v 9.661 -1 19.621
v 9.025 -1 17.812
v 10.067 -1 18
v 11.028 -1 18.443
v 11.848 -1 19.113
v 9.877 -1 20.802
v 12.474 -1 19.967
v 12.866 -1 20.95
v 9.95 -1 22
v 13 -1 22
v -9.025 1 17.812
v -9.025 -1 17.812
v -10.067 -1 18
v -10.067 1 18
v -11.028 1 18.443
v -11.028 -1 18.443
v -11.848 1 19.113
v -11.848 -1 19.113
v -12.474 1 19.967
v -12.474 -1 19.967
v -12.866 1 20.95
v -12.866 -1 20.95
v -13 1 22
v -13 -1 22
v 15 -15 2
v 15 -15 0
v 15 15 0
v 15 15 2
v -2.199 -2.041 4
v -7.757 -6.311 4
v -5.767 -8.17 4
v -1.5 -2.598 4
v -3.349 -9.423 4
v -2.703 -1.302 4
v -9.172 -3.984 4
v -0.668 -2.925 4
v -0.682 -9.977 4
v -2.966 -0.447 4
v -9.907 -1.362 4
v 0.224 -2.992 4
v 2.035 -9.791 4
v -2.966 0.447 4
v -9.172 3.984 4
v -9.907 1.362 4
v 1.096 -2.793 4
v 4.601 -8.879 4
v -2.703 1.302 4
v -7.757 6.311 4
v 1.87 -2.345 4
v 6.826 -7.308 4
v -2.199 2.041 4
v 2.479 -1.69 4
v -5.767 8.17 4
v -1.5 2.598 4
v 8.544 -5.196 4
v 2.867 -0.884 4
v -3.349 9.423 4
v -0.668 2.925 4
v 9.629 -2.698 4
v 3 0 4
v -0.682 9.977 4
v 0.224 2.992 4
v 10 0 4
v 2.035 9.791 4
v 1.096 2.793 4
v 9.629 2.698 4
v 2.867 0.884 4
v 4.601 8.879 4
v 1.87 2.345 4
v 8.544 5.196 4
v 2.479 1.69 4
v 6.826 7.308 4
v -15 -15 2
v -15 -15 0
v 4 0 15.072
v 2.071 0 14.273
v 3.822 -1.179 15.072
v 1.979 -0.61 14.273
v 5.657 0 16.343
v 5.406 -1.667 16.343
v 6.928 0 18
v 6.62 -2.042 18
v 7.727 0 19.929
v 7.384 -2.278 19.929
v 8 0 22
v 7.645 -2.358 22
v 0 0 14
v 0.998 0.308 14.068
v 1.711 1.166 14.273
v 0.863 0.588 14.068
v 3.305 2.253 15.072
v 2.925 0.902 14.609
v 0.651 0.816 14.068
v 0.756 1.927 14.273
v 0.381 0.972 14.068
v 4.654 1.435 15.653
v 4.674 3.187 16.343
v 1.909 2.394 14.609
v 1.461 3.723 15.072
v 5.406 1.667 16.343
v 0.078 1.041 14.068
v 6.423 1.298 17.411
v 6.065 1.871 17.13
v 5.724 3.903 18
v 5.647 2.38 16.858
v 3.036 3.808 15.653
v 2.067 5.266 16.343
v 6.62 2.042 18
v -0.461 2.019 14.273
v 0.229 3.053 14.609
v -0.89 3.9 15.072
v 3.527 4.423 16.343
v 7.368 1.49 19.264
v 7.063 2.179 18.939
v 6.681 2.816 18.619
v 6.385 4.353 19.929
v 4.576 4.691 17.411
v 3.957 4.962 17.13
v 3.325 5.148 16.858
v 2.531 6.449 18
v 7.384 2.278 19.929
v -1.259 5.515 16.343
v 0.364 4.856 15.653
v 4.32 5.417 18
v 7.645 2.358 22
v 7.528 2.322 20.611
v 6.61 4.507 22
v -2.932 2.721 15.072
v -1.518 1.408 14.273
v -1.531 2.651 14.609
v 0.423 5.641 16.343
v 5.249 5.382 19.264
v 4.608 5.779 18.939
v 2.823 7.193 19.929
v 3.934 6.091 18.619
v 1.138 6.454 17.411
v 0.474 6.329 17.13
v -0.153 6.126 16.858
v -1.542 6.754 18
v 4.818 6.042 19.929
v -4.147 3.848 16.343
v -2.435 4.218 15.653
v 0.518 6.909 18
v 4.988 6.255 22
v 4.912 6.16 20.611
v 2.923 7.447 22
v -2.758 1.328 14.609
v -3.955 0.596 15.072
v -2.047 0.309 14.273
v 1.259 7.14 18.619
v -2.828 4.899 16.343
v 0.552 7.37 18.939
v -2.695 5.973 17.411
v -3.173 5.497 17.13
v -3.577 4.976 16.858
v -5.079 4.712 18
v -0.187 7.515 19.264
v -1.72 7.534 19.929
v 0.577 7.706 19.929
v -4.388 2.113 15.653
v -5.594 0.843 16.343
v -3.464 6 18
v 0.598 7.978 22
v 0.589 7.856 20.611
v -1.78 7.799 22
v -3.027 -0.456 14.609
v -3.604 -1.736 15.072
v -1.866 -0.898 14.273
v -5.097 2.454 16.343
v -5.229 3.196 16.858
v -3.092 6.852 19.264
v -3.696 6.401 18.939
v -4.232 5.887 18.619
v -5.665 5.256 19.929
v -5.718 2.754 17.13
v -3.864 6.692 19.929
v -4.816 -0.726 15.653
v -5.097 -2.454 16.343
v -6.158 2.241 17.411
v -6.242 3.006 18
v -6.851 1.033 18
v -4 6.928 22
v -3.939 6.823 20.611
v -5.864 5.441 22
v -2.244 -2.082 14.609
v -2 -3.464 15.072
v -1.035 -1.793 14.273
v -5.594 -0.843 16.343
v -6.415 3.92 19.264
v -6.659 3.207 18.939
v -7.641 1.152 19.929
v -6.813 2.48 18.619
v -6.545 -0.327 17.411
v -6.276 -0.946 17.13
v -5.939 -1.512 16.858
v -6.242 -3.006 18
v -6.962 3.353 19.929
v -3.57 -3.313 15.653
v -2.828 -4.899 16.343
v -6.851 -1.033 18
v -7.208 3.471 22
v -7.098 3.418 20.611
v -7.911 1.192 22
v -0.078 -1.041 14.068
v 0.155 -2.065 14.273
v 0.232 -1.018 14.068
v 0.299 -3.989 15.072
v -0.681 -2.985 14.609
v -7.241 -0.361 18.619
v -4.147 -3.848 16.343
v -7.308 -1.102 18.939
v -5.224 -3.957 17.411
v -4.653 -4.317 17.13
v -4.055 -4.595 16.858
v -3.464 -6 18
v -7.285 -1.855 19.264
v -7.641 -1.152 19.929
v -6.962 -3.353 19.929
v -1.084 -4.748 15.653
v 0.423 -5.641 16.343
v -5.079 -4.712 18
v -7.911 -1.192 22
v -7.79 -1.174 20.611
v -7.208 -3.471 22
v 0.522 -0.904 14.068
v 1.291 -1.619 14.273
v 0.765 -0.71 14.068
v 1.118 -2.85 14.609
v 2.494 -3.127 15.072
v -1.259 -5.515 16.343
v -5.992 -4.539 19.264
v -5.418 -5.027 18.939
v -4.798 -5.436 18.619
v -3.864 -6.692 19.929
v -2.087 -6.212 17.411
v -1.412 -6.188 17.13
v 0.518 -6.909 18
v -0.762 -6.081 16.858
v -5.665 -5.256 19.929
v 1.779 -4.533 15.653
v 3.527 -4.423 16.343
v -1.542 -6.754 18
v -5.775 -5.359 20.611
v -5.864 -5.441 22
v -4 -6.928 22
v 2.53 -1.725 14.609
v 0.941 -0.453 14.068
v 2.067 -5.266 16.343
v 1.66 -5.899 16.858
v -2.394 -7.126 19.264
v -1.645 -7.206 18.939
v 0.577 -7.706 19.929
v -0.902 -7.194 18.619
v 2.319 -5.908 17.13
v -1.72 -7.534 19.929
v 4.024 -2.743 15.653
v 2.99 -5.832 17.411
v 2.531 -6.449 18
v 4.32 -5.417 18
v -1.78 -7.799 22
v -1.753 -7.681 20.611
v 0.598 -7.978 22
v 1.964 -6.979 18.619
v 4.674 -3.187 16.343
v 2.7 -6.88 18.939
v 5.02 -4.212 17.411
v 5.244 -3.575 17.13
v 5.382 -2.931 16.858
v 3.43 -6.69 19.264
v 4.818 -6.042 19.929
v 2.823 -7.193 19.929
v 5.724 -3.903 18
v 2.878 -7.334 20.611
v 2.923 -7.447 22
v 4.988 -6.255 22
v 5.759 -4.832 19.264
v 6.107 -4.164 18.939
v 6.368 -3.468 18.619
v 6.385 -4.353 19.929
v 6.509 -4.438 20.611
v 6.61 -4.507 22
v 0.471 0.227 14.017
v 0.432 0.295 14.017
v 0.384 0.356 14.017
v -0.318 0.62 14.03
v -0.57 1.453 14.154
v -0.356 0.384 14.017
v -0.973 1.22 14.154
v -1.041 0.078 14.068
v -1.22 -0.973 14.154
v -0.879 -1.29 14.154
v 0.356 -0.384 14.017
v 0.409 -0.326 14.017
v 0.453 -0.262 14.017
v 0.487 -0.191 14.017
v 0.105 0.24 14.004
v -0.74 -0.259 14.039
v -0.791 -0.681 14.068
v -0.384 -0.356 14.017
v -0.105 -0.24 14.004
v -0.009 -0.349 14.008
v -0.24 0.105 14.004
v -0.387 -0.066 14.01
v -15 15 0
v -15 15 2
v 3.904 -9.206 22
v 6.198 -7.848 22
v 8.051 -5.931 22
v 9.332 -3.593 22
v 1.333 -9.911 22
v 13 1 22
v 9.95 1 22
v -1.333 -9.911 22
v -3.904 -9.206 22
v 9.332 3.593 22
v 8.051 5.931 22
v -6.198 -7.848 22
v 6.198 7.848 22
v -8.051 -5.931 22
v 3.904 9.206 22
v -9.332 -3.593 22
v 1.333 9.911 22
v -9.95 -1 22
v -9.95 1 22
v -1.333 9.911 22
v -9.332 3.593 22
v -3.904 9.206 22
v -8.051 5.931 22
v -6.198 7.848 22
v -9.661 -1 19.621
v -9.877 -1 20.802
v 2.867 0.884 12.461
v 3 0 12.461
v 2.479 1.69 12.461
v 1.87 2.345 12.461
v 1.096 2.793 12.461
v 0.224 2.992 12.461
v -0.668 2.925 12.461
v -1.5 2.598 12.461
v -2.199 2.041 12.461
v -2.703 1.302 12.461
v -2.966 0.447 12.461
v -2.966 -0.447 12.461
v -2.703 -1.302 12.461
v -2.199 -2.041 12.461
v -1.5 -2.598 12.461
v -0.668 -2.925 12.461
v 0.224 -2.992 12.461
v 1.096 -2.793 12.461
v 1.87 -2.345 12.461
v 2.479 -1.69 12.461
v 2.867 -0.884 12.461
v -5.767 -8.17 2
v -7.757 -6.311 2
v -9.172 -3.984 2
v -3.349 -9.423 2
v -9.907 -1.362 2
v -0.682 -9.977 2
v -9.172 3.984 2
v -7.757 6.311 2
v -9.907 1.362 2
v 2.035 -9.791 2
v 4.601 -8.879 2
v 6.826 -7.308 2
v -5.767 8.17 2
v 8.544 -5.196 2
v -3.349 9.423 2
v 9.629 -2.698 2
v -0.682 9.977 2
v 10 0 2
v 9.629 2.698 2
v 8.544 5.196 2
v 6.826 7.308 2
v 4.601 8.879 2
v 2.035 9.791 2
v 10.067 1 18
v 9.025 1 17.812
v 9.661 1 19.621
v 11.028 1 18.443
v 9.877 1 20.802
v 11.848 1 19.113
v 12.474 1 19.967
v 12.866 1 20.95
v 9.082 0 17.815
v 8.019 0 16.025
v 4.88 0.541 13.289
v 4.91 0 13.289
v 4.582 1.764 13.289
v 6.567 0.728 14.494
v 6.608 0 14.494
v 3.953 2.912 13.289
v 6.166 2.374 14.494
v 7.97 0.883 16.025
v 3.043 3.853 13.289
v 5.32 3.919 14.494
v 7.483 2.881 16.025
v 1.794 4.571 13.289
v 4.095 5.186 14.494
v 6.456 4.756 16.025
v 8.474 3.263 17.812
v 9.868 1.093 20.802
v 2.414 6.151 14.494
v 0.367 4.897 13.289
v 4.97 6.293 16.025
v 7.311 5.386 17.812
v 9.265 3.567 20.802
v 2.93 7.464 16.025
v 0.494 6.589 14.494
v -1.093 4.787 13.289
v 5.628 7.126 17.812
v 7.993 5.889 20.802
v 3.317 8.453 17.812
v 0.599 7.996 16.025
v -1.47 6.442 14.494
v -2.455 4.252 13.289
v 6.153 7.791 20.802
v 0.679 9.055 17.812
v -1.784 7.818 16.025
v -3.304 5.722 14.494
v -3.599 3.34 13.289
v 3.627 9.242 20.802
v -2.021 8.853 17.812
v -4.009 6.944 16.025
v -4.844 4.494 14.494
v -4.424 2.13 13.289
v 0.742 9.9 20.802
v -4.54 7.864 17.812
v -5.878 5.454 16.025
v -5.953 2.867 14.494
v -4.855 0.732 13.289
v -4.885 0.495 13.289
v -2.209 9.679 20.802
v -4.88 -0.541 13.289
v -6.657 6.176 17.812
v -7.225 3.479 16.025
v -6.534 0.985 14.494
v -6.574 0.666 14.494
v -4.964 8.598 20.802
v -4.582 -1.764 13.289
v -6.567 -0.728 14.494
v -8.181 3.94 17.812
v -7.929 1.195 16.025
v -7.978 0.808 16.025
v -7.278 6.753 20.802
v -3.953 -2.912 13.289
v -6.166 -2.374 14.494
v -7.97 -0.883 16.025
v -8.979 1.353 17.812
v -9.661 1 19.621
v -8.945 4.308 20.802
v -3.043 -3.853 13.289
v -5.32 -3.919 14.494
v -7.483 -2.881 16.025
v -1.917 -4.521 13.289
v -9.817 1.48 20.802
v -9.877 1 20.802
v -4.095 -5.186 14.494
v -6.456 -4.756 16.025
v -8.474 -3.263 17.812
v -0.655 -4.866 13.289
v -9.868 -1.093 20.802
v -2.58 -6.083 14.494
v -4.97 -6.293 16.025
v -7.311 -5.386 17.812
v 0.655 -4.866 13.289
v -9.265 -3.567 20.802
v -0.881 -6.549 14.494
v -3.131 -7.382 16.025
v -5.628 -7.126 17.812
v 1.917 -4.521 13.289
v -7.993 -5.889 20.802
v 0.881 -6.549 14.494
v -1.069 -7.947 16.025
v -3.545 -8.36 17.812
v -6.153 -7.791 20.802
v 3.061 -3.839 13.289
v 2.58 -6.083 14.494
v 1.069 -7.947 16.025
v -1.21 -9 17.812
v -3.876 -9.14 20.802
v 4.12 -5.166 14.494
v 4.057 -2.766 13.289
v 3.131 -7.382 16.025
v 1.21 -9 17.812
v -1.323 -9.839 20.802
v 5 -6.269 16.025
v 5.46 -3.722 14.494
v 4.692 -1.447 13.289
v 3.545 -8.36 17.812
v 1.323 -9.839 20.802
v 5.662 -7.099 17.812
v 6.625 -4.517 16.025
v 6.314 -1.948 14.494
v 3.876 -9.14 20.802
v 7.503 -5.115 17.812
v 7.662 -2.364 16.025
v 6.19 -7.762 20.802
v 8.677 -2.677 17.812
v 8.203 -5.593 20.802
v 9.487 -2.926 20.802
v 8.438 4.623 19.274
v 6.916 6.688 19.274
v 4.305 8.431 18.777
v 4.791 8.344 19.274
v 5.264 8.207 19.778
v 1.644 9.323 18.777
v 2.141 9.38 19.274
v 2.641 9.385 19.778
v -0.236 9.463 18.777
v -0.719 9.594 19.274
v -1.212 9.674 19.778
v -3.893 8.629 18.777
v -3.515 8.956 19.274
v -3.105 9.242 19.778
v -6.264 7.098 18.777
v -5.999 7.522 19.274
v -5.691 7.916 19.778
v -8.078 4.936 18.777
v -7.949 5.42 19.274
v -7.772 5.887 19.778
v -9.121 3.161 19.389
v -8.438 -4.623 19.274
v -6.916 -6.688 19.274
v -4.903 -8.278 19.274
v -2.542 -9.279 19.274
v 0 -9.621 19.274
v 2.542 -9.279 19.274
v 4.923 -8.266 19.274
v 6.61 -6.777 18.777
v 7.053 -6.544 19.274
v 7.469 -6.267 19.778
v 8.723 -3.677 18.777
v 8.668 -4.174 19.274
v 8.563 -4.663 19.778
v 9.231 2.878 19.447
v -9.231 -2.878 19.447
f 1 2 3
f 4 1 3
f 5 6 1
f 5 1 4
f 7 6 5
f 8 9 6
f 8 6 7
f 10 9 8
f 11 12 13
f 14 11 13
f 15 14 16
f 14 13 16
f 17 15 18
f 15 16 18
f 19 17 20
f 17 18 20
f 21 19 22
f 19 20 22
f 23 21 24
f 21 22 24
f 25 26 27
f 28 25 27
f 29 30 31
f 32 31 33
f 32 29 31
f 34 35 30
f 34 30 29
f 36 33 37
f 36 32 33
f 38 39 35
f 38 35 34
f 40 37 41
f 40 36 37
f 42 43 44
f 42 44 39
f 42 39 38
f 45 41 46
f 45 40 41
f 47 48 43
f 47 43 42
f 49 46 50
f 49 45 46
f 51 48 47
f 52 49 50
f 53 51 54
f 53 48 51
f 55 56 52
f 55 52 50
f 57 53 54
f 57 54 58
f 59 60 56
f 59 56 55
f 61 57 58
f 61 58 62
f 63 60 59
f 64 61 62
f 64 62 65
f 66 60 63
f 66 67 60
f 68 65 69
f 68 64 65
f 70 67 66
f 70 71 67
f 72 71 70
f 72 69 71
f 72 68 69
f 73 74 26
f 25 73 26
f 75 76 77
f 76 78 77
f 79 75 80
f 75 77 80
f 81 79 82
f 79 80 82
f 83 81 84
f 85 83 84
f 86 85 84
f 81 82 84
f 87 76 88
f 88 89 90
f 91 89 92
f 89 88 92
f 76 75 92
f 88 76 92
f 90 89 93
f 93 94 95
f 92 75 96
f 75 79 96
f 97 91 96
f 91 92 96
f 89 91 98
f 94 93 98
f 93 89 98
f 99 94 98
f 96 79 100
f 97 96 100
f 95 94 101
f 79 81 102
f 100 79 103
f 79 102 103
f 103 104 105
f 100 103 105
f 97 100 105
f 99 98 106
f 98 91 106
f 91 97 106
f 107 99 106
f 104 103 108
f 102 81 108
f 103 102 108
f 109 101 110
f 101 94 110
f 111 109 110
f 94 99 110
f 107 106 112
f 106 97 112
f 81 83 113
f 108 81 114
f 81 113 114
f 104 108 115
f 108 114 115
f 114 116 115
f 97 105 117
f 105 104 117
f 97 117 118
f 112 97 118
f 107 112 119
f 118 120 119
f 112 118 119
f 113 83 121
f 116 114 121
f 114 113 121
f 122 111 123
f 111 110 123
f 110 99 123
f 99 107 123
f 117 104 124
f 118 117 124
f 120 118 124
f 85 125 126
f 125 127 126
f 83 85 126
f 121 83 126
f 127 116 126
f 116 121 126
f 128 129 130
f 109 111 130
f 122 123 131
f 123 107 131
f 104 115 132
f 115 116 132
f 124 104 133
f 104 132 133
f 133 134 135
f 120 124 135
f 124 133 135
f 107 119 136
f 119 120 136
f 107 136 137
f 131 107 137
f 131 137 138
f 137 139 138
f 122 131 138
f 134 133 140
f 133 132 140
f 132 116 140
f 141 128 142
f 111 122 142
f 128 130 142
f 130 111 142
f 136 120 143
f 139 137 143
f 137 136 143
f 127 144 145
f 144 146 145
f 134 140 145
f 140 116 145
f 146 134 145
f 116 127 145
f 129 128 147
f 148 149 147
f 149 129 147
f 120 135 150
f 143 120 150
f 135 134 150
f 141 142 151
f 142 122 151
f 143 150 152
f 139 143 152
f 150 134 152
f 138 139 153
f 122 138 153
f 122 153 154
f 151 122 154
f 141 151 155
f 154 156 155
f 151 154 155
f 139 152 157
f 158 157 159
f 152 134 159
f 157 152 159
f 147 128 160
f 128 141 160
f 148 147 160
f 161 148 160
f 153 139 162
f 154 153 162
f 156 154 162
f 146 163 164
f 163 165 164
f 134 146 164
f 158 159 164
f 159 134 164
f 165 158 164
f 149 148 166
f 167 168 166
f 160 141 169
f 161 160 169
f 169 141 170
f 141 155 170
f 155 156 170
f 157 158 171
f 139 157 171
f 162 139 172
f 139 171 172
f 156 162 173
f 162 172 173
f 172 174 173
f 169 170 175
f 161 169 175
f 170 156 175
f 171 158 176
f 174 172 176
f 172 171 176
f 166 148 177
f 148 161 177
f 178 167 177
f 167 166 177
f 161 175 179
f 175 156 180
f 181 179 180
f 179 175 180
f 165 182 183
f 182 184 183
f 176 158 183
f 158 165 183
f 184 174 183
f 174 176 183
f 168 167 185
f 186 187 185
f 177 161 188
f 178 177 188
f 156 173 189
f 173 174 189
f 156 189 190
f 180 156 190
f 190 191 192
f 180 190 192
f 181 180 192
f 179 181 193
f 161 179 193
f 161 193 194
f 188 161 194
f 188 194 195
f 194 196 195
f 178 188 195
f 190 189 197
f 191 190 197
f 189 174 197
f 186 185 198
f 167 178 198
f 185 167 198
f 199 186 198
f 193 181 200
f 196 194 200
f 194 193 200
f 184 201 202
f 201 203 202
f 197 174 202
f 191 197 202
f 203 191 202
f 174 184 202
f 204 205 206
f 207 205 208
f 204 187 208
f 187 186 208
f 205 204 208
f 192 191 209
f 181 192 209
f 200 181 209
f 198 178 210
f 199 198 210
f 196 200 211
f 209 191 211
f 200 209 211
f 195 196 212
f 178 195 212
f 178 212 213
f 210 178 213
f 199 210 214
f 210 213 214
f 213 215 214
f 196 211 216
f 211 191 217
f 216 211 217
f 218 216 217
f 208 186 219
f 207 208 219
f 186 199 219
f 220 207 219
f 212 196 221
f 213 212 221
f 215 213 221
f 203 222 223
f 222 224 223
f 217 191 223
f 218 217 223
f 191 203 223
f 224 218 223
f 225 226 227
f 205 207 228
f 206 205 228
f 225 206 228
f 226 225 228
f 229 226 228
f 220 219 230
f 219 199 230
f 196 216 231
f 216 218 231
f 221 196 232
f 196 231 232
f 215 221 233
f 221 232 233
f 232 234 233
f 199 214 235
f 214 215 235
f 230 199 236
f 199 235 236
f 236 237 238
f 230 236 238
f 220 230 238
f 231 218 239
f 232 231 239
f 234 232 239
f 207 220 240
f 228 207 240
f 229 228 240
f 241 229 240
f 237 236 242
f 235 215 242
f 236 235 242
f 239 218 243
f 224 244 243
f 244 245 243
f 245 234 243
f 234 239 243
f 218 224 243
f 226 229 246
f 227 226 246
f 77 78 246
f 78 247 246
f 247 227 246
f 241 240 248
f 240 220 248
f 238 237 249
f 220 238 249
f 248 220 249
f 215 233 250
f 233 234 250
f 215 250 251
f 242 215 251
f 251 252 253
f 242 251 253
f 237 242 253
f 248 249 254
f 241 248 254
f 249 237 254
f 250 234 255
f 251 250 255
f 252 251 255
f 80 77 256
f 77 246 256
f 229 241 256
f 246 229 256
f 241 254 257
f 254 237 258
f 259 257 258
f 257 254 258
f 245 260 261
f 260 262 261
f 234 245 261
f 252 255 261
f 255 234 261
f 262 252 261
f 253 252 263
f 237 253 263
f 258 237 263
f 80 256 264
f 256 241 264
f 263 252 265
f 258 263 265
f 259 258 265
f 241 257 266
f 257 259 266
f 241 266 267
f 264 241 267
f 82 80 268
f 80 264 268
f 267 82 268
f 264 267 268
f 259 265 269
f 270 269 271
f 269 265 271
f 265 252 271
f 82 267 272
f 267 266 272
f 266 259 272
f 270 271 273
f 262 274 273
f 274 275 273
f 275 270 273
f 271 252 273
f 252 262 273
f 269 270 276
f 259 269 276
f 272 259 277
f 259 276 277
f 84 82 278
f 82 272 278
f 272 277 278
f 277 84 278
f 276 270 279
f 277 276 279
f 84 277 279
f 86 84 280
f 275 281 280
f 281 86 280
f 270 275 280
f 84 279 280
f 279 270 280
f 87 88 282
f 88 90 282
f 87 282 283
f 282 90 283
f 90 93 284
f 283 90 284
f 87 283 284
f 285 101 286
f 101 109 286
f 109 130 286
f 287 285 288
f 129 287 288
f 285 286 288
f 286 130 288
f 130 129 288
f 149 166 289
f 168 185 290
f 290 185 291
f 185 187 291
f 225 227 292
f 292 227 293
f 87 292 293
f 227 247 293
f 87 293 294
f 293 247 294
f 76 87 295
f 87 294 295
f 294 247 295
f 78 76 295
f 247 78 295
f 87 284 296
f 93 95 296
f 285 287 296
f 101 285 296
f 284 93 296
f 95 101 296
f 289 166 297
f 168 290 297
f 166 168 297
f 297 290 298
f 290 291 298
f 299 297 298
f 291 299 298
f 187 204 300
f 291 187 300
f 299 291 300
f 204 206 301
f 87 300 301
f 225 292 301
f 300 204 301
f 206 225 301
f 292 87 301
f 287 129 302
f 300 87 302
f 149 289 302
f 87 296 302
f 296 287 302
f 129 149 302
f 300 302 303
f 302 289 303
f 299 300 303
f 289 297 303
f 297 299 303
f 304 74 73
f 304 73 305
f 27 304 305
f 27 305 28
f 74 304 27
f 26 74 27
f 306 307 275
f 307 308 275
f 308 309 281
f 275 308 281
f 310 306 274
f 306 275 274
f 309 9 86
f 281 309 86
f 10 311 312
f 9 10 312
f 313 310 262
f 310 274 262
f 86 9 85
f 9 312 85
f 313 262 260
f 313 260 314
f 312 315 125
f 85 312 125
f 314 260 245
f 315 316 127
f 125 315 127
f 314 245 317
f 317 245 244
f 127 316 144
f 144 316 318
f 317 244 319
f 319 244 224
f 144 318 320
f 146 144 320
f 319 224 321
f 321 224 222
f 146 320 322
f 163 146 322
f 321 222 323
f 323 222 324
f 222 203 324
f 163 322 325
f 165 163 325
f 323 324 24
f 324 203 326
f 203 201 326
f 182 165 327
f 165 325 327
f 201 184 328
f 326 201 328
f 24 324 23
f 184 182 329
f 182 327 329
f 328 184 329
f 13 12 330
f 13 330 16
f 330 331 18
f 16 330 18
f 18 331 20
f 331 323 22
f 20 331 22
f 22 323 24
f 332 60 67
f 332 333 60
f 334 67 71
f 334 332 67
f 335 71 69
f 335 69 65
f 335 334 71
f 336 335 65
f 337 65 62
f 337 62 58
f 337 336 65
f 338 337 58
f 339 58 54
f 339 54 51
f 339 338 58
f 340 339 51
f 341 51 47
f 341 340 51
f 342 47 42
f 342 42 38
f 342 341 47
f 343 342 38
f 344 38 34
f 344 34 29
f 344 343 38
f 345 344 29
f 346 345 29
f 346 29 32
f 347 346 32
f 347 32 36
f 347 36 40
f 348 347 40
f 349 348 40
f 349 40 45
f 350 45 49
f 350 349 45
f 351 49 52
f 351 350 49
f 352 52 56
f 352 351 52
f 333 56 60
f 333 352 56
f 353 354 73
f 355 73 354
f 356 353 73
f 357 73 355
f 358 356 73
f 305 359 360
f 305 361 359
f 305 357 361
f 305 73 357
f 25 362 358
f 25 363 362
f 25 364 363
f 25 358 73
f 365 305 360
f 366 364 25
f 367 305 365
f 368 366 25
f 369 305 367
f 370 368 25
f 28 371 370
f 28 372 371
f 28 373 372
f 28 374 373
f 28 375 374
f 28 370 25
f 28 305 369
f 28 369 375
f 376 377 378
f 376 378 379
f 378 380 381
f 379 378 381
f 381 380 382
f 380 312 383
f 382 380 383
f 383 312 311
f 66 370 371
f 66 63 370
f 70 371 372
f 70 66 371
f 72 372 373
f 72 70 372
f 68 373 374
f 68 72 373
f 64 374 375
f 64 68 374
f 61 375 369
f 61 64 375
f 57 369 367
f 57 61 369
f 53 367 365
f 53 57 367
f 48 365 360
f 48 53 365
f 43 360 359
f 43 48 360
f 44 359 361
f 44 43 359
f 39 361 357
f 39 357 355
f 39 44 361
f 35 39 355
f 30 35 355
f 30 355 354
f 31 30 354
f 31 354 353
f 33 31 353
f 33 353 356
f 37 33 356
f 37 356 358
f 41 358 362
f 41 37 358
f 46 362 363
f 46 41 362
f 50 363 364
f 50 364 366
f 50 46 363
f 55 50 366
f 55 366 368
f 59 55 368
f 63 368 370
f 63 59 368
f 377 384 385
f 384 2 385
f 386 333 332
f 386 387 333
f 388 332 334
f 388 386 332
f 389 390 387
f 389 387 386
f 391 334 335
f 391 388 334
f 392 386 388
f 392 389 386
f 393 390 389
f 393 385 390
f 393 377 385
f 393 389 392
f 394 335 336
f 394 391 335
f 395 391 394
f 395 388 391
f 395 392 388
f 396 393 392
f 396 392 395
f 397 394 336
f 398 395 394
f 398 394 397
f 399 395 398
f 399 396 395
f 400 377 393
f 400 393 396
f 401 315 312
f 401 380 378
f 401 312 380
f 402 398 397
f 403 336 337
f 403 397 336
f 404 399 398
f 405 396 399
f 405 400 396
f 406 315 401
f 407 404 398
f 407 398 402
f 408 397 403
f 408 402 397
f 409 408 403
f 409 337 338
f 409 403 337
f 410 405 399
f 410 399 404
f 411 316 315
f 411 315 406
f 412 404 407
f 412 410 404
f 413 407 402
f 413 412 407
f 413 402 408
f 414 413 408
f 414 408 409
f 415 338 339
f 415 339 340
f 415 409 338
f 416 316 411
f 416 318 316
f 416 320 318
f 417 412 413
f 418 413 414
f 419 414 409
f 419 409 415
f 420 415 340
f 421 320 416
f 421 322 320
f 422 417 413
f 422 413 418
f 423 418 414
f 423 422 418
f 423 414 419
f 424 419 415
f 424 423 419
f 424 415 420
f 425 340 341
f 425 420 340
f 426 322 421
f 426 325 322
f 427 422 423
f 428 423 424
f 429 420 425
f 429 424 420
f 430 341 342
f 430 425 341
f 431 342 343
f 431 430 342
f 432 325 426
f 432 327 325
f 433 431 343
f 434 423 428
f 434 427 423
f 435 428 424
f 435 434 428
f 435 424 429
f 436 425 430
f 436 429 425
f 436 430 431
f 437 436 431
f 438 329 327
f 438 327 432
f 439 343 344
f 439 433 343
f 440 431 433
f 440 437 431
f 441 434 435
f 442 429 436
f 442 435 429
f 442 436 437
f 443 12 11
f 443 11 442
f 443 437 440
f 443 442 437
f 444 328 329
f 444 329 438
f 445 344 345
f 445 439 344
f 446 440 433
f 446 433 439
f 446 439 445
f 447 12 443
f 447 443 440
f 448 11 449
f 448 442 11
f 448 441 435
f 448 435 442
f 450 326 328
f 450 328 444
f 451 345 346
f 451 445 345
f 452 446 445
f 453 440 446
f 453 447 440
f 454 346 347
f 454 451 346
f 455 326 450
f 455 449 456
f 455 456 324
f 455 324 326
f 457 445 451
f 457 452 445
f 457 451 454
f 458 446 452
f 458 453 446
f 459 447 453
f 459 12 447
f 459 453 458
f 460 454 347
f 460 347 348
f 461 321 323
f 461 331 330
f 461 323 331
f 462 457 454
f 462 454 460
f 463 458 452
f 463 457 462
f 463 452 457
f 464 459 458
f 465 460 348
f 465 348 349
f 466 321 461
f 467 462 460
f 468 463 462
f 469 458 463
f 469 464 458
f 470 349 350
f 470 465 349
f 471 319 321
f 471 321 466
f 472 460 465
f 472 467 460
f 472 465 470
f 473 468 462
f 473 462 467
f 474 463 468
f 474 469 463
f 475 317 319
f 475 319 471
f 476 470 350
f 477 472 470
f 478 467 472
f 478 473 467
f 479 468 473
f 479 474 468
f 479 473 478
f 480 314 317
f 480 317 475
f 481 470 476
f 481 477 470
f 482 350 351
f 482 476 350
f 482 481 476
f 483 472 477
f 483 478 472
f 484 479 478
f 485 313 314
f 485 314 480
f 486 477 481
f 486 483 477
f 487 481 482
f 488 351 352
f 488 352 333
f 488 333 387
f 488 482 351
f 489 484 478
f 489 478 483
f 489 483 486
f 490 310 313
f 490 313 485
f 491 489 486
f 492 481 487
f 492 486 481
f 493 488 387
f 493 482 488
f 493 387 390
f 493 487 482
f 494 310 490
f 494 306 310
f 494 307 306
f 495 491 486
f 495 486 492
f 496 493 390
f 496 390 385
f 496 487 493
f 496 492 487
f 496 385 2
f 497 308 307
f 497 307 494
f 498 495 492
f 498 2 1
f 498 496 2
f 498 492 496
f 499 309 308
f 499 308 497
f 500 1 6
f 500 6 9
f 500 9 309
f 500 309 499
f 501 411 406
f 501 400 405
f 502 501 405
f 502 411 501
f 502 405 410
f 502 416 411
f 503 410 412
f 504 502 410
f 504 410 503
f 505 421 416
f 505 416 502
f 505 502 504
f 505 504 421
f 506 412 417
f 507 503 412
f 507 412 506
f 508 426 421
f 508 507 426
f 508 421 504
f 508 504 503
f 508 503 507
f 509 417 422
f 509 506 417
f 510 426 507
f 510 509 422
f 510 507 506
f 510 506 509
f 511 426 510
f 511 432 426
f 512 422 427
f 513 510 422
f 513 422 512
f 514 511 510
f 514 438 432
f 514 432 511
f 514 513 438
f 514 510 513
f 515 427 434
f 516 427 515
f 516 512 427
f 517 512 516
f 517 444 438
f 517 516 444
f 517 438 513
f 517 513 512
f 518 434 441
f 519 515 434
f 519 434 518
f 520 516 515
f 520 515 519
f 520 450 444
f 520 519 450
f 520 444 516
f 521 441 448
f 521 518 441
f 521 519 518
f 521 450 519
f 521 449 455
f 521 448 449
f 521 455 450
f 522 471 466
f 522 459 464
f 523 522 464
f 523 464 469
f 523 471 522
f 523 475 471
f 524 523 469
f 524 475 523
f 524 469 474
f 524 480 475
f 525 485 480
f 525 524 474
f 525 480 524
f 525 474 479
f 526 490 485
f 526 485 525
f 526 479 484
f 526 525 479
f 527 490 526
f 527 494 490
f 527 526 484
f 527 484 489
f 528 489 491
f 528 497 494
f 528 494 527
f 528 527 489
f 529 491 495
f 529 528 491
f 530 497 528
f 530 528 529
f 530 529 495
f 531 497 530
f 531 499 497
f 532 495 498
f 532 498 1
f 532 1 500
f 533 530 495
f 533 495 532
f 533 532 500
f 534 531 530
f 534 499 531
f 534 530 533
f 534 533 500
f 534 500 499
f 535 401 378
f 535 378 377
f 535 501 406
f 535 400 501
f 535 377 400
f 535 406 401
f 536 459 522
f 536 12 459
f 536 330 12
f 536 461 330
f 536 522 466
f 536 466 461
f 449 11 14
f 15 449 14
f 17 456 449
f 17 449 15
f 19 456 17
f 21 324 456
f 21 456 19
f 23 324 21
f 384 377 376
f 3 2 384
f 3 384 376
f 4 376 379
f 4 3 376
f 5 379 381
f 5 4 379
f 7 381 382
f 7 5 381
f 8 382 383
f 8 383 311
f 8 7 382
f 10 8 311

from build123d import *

# Parameters (mm, degrees)
SKETCH_W     = 30
SKETCH_H     = 30
PAD_DEPTH    = 2
PAD001_DEPTH = 1


with BuildPart() as part:
    # Sketch → Pad (new body)
    with BuildSketch(Plane.XY):
        Rectangle(SKETCH_W, SKETCH_H)
    extrude(amount=PAD_DEPTH)

    # Sketch001 → Revolution (revolve)
    with BuildSketch(Plane.XZ):
        with BuildLine():
            Line((0, 2), (10, 2))
            Line((10, 2), (10, 4))
            Line((10, 4), (3, 4))
            Line((3, 4), (3, 12.460608))
            ThreePointArc((3, 12.460608), (8.062258, 16.08392), (10, 22))
            Line((8, 22), (10, 22))
            ThreePointArc((0, 14), (5.656854, 16.343146), (8, 22))
            Line((0, 2), (0, 14))
        make_face()
    revolve(axis=Axis((0, 0, 0), (0, 0, 1)))

    # Sketch002 → Pad001 (join, symmetric)
    with BuildSketch(Plane.XZ):
        with BuildLine():
            ThreePointArc((7.544119, 18), (11.285683, 18.617448), (13, 22))
            Line((9, 22), (13, 22))
            Line((7.544119, 18), (9, 22))
        make_face()
    pad001 = extrude(amount=PAD001_DEPTH, both=True)

    # Mirrored: Pad001 across Sketch002 V_Axis
    add(pad001.mirror(Plane(origin=(0, 0, 0), x_dir=(0, -1, 0), z_dir=(1, 0, 0))))


solid = part.part
